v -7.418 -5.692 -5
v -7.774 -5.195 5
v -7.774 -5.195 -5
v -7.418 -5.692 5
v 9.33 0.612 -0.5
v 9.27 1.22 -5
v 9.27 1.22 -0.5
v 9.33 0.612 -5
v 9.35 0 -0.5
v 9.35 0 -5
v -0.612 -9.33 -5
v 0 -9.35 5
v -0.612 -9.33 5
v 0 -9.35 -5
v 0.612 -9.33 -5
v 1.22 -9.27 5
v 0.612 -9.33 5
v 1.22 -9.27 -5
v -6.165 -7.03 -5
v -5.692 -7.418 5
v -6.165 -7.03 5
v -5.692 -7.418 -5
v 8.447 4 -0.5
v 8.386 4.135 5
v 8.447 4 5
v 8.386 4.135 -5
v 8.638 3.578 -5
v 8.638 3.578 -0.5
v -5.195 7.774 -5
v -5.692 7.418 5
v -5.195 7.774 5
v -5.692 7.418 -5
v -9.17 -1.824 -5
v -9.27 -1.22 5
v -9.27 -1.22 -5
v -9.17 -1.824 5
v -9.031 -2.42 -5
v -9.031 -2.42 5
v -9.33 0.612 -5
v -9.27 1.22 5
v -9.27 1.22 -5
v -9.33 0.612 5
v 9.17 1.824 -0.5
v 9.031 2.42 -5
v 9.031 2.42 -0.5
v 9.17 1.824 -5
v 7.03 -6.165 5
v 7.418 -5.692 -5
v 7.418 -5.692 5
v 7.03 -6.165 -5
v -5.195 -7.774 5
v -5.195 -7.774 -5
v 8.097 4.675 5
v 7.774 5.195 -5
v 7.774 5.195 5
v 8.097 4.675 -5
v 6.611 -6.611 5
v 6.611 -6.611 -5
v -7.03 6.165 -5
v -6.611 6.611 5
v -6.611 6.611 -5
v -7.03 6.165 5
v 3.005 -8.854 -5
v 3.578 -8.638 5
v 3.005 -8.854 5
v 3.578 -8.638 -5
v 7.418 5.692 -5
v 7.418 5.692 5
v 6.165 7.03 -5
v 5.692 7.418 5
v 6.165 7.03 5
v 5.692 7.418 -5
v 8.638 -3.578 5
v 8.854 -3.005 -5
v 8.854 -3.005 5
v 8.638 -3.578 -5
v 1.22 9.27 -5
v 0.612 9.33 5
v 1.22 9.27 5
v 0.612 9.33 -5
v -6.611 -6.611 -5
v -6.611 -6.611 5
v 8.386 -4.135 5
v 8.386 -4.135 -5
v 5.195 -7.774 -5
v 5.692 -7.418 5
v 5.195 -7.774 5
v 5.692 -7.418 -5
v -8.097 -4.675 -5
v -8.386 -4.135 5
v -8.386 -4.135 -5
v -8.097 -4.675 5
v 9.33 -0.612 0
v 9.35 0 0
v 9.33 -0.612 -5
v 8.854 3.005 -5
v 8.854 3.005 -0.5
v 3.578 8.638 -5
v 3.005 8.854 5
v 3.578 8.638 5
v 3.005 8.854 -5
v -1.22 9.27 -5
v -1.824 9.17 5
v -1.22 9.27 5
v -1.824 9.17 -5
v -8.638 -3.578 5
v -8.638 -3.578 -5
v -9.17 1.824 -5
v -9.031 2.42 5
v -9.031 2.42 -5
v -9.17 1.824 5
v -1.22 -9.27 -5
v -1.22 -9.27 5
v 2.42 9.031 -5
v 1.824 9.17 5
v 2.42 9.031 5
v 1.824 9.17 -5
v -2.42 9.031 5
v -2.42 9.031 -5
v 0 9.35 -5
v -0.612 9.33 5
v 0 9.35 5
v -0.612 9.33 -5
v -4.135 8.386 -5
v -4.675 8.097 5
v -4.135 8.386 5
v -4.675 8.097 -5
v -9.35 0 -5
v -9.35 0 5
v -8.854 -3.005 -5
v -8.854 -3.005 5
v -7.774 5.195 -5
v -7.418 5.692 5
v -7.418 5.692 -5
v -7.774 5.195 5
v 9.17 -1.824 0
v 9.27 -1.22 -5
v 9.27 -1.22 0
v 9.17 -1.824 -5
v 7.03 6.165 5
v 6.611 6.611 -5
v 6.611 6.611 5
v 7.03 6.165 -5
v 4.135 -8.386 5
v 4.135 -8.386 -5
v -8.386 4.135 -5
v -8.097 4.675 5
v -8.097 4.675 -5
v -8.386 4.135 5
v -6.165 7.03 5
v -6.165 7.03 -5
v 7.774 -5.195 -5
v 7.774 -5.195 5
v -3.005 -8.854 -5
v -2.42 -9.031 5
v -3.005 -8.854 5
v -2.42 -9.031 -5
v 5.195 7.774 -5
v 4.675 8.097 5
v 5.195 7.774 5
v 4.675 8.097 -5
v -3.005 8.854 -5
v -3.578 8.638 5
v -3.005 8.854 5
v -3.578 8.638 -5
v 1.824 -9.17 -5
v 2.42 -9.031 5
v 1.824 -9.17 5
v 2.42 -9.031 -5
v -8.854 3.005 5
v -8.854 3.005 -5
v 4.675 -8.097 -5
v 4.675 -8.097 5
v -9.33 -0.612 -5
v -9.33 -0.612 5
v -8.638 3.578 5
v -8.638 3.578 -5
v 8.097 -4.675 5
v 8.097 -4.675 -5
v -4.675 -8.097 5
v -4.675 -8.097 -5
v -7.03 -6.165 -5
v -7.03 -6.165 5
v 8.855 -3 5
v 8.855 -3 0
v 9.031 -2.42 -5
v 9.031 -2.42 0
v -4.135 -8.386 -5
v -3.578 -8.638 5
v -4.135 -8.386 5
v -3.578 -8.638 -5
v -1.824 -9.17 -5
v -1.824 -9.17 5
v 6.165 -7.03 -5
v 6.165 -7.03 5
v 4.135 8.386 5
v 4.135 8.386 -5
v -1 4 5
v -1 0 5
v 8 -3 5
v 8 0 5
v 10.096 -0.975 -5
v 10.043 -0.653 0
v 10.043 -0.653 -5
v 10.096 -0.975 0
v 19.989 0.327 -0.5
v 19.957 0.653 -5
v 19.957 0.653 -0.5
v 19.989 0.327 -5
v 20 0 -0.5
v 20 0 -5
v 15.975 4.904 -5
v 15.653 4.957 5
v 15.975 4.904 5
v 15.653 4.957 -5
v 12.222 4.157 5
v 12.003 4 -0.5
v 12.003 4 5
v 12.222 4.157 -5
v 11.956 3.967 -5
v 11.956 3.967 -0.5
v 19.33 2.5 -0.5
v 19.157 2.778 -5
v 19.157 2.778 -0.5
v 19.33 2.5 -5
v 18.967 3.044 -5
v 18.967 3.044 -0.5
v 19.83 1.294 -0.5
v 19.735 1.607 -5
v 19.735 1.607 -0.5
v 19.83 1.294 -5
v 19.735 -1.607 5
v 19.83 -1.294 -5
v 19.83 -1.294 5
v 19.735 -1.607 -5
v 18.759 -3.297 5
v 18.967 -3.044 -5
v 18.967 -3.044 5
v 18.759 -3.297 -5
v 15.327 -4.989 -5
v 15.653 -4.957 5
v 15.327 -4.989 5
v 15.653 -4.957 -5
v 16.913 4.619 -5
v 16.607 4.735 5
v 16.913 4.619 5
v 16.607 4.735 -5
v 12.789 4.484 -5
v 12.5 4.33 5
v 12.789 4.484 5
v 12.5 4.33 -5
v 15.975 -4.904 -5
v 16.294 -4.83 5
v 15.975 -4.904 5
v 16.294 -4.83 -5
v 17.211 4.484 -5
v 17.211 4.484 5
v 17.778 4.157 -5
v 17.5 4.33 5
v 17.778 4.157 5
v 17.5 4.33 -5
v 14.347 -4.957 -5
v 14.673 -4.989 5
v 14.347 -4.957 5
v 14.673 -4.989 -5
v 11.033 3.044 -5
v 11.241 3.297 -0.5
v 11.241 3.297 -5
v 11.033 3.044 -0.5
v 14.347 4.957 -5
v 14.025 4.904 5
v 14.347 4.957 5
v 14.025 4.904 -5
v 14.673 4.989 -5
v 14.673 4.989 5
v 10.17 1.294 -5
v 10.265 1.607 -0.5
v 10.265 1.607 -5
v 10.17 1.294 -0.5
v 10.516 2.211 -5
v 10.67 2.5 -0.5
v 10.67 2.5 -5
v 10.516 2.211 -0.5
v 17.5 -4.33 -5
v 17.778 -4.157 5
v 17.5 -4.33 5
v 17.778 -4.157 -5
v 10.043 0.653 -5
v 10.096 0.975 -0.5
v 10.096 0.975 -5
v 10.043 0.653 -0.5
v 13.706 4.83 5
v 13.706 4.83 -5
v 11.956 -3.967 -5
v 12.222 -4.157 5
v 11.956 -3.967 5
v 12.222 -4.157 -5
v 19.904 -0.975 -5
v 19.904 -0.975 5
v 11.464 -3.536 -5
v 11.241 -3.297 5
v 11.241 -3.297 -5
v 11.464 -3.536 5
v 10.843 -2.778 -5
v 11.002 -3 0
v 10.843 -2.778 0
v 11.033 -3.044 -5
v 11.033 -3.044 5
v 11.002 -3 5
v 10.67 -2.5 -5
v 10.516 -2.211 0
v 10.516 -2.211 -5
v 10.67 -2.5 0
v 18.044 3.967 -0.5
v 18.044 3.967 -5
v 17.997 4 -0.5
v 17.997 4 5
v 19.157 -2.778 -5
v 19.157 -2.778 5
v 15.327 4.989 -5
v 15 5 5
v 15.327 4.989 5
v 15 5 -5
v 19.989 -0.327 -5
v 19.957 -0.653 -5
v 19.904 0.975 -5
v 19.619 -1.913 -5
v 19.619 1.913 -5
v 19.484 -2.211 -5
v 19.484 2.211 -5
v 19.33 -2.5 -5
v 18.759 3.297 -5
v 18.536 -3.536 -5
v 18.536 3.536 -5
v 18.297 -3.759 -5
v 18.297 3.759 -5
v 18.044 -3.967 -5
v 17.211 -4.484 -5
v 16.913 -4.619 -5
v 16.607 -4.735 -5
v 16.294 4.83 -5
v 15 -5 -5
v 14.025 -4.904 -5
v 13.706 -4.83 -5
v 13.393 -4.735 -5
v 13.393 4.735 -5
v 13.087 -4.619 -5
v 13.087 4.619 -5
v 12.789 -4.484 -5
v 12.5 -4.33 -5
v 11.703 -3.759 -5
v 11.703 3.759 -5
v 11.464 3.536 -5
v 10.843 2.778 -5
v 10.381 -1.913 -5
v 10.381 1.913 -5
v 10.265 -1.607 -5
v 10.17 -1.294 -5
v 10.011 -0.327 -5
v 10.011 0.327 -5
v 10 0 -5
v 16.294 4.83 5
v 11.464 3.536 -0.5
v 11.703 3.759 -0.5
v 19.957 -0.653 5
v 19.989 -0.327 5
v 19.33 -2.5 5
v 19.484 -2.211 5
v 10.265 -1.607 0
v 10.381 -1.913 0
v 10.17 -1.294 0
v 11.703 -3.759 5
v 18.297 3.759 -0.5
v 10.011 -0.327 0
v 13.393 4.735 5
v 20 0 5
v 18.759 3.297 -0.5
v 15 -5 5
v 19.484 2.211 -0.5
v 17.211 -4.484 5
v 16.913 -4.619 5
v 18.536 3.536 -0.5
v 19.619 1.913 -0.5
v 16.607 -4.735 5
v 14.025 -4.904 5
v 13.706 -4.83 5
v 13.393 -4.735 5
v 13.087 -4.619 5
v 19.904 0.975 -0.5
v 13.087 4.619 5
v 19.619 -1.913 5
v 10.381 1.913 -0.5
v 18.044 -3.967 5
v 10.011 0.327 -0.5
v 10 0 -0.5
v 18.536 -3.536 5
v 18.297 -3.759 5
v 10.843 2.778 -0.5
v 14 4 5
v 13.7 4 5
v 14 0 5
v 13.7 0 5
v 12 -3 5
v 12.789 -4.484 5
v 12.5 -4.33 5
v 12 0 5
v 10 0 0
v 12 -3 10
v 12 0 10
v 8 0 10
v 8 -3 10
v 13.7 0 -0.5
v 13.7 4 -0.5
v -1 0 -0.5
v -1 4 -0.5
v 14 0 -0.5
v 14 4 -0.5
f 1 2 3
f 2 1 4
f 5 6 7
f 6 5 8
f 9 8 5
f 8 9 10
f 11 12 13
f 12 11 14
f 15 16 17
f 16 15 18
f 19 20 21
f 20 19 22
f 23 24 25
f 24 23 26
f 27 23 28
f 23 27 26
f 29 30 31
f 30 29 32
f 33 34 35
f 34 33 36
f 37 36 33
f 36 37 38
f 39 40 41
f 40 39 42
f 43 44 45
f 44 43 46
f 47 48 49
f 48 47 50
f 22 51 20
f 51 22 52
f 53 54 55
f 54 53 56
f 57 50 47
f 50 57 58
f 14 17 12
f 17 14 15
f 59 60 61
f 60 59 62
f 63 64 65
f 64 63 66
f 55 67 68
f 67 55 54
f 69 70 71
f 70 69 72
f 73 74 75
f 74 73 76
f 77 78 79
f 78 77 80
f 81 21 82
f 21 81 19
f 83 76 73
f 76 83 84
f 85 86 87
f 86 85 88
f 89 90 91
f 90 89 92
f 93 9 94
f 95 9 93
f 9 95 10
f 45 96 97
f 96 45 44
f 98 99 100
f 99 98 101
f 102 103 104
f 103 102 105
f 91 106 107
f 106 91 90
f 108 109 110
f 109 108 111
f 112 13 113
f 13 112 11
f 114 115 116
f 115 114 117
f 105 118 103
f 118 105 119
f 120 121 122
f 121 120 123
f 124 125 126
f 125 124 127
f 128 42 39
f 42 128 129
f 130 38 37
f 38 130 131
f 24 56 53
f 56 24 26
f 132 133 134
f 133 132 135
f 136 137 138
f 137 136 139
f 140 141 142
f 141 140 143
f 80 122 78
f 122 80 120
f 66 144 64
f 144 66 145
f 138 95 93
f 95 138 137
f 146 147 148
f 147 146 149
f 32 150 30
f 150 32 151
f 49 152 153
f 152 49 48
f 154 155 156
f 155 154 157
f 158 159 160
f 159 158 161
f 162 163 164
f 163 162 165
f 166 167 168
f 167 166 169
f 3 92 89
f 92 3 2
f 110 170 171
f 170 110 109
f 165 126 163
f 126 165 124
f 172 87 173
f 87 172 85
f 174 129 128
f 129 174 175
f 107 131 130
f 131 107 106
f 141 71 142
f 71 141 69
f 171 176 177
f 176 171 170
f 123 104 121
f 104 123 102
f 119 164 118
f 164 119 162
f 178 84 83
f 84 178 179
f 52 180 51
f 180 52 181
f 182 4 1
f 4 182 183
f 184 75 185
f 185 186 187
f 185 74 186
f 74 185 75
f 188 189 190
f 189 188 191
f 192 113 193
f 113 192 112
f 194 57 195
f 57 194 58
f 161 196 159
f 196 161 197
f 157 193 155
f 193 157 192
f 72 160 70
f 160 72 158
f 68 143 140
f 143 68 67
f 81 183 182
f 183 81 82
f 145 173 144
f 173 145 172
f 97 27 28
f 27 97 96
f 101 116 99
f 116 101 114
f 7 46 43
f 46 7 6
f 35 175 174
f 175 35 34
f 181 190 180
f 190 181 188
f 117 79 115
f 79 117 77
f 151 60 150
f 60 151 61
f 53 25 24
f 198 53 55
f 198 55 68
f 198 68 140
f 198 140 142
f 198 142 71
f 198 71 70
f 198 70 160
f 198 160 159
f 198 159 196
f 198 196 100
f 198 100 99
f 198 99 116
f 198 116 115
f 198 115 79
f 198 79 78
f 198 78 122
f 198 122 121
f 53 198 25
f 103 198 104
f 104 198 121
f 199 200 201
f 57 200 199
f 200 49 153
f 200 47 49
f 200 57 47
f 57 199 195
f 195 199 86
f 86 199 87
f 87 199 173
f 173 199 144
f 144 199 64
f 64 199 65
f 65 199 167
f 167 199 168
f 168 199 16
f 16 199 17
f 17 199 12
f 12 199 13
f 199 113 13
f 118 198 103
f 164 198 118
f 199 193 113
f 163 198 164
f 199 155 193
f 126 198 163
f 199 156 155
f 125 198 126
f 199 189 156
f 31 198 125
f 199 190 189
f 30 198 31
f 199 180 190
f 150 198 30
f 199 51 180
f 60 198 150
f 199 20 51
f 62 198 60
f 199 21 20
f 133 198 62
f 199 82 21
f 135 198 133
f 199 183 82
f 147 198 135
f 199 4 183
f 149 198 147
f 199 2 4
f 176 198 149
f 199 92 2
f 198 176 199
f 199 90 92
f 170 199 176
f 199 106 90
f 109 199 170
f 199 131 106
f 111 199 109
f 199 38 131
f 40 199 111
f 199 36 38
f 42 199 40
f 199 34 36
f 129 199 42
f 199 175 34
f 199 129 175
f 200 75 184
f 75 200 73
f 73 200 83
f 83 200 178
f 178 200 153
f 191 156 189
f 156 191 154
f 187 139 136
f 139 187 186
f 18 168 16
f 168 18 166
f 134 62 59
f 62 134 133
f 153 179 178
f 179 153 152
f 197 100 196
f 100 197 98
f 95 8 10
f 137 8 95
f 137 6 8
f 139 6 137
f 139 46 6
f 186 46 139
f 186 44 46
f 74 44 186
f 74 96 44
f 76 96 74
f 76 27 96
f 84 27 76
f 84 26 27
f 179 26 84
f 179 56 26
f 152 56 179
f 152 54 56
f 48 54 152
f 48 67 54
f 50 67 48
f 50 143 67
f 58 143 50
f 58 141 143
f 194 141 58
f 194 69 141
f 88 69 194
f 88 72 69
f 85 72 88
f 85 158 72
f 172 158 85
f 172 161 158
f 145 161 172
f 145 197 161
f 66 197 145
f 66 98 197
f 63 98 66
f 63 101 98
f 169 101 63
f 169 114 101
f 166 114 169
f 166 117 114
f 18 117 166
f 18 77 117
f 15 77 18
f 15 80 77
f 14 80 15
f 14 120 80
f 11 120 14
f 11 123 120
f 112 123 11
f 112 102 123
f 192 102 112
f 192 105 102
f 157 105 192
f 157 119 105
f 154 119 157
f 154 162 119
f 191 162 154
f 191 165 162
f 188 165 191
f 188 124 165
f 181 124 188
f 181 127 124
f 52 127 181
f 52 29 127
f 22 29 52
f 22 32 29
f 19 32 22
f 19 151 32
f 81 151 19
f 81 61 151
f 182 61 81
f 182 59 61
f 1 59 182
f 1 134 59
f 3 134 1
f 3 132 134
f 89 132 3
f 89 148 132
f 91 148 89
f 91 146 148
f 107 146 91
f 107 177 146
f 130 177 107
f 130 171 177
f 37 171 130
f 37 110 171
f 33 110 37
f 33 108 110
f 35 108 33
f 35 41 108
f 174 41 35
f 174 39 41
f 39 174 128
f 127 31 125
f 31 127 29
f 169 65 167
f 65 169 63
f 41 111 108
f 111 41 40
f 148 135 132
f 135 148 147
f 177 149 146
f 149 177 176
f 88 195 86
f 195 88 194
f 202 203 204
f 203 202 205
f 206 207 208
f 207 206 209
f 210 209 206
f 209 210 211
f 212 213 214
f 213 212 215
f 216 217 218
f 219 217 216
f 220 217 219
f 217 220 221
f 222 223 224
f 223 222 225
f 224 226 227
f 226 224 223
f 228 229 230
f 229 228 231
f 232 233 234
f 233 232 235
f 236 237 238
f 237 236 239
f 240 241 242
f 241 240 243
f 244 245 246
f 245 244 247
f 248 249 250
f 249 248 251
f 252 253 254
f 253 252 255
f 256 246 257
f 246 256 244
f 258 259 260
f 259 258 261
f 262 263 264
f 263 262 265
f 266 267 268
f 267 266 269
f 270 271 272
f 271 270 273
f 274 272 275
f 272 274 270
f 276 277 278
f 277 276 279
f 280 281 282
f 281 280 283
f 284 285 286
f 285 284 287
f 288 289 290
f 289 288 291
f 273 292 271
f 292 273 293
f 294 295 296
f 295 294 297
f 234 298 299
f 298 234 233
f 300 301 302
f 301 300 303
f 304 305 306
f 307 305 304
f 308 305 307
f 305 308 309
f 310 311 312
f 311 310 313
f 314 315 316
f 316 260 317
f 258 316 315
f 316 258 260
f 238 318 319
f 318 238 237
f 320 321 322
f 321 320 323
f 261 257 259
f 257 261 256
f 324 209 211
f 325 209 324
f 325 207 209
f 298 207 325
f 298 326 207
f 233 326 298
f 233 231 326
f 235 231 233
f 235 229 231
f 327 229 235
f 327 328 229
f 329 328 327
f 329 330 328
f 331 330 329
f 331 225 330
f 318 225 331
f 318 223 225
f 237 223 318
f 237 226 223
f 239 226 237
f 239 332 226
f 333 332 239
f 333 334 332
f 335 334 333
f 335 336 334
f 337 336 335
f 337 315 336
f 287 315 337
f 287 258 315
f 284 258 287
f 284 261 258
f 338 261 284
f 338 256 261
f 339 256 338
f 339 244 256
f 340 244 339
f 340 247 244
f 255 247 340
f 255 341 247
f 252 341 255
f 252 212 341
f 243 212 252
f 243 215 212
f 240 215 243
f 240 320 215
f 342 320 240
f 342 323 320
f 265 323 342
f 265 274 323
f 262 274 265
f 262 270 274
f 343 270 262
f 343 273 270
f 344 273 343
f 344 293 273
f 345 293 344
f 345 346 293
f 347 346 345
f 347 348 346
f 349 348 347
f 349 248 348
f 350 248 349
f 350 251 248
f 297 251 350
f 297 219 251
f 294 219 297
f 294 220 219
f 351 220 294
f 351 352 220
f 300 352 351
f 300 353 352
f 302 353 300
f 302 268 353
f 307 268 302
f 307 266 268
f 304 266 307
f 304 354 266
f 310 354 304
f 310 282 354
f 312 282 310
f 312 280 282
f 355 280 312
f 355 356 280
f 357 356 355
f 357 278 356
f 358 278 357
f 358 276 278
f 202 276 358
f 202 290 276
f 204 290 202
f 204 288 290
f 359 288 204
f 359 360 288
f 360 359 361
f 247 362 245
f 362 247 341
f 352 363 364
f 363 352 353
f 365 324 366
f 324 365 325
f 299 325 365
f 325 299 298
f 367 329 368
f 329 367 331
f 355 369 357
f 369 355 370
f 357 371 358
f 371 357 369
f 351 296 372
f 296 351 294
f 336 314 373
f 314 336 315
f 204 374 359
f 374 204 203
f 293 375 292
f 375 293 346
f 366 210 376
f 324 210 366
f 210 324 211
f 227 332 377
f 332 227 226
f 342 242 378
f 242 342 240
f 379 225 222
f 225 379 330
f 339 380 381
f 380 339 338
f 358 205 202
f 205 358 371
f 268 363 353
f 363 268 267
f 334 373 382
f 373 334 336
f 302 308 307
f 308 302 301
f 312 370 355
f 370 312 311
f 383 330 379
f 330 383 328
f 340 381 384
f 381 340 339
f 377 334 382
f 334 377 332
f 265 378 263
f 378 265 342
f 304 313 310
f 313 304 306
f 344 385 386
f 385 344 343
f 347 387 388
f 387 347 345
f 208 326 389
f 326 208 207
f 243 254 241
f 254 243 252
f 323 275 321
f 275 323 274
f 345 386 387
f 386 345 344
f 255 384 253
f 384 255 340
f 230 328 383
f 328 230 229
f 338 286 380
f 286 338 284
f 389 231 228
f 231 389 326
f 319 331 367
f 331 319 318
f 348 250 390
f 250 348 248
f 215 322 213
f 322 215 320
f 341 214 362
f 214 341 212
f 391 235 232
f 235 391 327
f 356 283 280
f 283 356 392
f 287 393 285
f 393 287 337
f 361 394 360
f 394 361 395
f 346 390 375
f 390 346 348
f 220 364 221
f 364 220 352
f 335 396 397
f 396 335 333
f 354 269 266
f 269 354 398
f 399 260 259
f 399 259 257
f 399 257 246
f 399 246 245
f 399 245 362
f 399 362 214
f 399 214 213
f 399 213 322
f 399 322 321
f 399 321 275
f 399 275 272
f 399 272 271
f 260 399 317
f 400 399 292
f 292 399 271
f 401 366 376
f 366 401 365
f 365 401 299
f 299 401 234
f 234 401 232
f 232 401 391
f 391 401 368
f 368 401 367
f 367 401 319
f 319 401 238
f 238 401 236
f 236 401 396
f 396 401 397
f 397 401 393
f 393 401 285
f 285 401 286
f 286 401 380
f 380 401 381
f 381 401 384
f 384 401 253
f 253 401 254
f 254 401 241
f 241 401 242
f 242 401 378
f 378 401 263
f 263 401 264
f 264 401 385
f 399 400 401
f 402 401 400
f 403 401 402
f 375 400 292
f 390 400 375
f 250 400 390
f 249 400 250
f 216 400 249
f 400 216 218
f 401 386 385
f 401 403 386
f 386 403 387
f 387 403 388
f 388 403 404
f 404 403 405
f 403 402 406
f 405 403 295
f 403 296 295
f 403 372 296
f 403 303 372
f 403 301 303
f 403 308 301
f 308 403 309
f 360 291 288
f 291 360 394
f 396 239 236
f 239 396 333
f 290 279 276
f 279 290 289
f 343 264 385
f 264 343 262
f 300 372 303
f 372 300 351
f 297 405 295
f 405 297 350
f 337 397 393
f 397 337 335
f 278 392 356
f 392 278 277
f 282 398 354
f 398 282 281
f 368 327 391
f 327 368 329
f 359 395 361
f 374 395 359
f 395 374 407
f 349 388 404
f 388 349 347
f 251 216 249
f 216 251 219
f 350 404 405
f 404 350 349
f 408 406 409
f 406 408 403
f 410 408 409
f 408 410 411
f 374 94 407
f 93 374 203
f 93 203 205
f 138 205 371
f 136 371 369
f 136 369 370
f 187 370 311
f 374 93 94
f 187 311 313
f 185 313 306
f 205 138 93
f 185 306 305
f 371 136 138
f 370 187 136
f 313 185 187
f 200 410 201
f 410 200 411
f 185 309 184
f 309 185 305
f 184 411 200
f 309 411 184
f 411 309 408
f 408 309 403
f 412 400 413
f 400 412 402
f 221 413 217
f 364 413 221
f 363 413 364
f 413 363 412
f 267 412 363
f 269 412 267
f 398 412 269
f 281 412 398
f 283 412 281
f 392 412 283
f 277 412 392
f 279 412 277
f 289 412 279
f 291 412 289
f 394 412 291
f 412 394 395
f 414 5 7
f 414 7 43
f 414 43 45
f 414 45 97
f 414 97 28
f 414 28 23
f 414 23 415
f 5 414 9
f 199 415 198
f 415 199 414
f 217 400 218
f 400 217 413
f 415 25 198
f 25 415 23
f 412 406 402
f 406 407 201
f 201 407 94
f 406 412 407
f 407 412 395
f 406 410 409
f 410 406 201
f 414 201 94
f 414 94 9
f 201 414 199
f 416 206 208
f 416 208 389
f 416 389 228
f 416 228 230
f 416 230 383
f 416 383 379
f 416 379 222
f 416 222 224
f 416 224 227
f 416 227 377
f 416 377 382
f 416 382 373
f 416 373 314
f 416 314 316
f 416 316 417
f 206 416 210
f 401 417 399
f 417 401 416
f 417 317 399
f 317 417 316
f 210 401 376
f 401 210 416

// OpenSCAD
// Tubing clip for 12.7 mm stand rod
// Print orientation: flat on bed, extrusion along +Z

// ---- Stand rod ring ----
stand_d = 12.7;      // stand rod diameter
stand_w = 3;         // stand ring wall
stand_od = stand_d + 2 * stand_w;  // 18.7 mm outer diameter
stand_x = 0;         // ring centre X
stand_y = 0;         // ring centre Y

// ---- Tubing ring ----
tube_d = 6;          // tubing inner diameter
tube_w = 2;          // tubing wall
tube_od = tube_d + 2 * tube_w;    // 10 mm outer diameter
tube_x = 15;         // ring centre X
tube_y = 0;          // ring centre Y

// ---- Bridge ----
bridge_w = 6;        // bridge width in Y
bridge_x0 = 8;       // bridge start X
bridge_x1 = 12;      // bridge end X

// ---- Misc ----
eps = 0.5;           // cutter overshoot
$fn = 96;

difference() {
    union() {
        // Stand ring
        cylinder(d = stand_od, h = 10, center = true);
        // Tubing ring
        translate([tube_x, tube_y, 0])
            cylinder(d = tube_od, h = 10, center = true);
        // Bridge
        translate([bridge_x0, -bridge_w / 2, 0])
            cube([bridge_x1 - bridge_x0, bridge_w, 10]);
    }
    // Stand rod opening (through the ring)
    translate([stand_x - 1, stand_y, -eps])
        cube([stand_d + 2, 4, 10 + 2 * eps]);
    // Tubing opening (through the ring)
    translate([tube_x - 1, tube_y, -eps])
        cube([tube_d + 2, 4, 10 + 2 * eps]);
}
